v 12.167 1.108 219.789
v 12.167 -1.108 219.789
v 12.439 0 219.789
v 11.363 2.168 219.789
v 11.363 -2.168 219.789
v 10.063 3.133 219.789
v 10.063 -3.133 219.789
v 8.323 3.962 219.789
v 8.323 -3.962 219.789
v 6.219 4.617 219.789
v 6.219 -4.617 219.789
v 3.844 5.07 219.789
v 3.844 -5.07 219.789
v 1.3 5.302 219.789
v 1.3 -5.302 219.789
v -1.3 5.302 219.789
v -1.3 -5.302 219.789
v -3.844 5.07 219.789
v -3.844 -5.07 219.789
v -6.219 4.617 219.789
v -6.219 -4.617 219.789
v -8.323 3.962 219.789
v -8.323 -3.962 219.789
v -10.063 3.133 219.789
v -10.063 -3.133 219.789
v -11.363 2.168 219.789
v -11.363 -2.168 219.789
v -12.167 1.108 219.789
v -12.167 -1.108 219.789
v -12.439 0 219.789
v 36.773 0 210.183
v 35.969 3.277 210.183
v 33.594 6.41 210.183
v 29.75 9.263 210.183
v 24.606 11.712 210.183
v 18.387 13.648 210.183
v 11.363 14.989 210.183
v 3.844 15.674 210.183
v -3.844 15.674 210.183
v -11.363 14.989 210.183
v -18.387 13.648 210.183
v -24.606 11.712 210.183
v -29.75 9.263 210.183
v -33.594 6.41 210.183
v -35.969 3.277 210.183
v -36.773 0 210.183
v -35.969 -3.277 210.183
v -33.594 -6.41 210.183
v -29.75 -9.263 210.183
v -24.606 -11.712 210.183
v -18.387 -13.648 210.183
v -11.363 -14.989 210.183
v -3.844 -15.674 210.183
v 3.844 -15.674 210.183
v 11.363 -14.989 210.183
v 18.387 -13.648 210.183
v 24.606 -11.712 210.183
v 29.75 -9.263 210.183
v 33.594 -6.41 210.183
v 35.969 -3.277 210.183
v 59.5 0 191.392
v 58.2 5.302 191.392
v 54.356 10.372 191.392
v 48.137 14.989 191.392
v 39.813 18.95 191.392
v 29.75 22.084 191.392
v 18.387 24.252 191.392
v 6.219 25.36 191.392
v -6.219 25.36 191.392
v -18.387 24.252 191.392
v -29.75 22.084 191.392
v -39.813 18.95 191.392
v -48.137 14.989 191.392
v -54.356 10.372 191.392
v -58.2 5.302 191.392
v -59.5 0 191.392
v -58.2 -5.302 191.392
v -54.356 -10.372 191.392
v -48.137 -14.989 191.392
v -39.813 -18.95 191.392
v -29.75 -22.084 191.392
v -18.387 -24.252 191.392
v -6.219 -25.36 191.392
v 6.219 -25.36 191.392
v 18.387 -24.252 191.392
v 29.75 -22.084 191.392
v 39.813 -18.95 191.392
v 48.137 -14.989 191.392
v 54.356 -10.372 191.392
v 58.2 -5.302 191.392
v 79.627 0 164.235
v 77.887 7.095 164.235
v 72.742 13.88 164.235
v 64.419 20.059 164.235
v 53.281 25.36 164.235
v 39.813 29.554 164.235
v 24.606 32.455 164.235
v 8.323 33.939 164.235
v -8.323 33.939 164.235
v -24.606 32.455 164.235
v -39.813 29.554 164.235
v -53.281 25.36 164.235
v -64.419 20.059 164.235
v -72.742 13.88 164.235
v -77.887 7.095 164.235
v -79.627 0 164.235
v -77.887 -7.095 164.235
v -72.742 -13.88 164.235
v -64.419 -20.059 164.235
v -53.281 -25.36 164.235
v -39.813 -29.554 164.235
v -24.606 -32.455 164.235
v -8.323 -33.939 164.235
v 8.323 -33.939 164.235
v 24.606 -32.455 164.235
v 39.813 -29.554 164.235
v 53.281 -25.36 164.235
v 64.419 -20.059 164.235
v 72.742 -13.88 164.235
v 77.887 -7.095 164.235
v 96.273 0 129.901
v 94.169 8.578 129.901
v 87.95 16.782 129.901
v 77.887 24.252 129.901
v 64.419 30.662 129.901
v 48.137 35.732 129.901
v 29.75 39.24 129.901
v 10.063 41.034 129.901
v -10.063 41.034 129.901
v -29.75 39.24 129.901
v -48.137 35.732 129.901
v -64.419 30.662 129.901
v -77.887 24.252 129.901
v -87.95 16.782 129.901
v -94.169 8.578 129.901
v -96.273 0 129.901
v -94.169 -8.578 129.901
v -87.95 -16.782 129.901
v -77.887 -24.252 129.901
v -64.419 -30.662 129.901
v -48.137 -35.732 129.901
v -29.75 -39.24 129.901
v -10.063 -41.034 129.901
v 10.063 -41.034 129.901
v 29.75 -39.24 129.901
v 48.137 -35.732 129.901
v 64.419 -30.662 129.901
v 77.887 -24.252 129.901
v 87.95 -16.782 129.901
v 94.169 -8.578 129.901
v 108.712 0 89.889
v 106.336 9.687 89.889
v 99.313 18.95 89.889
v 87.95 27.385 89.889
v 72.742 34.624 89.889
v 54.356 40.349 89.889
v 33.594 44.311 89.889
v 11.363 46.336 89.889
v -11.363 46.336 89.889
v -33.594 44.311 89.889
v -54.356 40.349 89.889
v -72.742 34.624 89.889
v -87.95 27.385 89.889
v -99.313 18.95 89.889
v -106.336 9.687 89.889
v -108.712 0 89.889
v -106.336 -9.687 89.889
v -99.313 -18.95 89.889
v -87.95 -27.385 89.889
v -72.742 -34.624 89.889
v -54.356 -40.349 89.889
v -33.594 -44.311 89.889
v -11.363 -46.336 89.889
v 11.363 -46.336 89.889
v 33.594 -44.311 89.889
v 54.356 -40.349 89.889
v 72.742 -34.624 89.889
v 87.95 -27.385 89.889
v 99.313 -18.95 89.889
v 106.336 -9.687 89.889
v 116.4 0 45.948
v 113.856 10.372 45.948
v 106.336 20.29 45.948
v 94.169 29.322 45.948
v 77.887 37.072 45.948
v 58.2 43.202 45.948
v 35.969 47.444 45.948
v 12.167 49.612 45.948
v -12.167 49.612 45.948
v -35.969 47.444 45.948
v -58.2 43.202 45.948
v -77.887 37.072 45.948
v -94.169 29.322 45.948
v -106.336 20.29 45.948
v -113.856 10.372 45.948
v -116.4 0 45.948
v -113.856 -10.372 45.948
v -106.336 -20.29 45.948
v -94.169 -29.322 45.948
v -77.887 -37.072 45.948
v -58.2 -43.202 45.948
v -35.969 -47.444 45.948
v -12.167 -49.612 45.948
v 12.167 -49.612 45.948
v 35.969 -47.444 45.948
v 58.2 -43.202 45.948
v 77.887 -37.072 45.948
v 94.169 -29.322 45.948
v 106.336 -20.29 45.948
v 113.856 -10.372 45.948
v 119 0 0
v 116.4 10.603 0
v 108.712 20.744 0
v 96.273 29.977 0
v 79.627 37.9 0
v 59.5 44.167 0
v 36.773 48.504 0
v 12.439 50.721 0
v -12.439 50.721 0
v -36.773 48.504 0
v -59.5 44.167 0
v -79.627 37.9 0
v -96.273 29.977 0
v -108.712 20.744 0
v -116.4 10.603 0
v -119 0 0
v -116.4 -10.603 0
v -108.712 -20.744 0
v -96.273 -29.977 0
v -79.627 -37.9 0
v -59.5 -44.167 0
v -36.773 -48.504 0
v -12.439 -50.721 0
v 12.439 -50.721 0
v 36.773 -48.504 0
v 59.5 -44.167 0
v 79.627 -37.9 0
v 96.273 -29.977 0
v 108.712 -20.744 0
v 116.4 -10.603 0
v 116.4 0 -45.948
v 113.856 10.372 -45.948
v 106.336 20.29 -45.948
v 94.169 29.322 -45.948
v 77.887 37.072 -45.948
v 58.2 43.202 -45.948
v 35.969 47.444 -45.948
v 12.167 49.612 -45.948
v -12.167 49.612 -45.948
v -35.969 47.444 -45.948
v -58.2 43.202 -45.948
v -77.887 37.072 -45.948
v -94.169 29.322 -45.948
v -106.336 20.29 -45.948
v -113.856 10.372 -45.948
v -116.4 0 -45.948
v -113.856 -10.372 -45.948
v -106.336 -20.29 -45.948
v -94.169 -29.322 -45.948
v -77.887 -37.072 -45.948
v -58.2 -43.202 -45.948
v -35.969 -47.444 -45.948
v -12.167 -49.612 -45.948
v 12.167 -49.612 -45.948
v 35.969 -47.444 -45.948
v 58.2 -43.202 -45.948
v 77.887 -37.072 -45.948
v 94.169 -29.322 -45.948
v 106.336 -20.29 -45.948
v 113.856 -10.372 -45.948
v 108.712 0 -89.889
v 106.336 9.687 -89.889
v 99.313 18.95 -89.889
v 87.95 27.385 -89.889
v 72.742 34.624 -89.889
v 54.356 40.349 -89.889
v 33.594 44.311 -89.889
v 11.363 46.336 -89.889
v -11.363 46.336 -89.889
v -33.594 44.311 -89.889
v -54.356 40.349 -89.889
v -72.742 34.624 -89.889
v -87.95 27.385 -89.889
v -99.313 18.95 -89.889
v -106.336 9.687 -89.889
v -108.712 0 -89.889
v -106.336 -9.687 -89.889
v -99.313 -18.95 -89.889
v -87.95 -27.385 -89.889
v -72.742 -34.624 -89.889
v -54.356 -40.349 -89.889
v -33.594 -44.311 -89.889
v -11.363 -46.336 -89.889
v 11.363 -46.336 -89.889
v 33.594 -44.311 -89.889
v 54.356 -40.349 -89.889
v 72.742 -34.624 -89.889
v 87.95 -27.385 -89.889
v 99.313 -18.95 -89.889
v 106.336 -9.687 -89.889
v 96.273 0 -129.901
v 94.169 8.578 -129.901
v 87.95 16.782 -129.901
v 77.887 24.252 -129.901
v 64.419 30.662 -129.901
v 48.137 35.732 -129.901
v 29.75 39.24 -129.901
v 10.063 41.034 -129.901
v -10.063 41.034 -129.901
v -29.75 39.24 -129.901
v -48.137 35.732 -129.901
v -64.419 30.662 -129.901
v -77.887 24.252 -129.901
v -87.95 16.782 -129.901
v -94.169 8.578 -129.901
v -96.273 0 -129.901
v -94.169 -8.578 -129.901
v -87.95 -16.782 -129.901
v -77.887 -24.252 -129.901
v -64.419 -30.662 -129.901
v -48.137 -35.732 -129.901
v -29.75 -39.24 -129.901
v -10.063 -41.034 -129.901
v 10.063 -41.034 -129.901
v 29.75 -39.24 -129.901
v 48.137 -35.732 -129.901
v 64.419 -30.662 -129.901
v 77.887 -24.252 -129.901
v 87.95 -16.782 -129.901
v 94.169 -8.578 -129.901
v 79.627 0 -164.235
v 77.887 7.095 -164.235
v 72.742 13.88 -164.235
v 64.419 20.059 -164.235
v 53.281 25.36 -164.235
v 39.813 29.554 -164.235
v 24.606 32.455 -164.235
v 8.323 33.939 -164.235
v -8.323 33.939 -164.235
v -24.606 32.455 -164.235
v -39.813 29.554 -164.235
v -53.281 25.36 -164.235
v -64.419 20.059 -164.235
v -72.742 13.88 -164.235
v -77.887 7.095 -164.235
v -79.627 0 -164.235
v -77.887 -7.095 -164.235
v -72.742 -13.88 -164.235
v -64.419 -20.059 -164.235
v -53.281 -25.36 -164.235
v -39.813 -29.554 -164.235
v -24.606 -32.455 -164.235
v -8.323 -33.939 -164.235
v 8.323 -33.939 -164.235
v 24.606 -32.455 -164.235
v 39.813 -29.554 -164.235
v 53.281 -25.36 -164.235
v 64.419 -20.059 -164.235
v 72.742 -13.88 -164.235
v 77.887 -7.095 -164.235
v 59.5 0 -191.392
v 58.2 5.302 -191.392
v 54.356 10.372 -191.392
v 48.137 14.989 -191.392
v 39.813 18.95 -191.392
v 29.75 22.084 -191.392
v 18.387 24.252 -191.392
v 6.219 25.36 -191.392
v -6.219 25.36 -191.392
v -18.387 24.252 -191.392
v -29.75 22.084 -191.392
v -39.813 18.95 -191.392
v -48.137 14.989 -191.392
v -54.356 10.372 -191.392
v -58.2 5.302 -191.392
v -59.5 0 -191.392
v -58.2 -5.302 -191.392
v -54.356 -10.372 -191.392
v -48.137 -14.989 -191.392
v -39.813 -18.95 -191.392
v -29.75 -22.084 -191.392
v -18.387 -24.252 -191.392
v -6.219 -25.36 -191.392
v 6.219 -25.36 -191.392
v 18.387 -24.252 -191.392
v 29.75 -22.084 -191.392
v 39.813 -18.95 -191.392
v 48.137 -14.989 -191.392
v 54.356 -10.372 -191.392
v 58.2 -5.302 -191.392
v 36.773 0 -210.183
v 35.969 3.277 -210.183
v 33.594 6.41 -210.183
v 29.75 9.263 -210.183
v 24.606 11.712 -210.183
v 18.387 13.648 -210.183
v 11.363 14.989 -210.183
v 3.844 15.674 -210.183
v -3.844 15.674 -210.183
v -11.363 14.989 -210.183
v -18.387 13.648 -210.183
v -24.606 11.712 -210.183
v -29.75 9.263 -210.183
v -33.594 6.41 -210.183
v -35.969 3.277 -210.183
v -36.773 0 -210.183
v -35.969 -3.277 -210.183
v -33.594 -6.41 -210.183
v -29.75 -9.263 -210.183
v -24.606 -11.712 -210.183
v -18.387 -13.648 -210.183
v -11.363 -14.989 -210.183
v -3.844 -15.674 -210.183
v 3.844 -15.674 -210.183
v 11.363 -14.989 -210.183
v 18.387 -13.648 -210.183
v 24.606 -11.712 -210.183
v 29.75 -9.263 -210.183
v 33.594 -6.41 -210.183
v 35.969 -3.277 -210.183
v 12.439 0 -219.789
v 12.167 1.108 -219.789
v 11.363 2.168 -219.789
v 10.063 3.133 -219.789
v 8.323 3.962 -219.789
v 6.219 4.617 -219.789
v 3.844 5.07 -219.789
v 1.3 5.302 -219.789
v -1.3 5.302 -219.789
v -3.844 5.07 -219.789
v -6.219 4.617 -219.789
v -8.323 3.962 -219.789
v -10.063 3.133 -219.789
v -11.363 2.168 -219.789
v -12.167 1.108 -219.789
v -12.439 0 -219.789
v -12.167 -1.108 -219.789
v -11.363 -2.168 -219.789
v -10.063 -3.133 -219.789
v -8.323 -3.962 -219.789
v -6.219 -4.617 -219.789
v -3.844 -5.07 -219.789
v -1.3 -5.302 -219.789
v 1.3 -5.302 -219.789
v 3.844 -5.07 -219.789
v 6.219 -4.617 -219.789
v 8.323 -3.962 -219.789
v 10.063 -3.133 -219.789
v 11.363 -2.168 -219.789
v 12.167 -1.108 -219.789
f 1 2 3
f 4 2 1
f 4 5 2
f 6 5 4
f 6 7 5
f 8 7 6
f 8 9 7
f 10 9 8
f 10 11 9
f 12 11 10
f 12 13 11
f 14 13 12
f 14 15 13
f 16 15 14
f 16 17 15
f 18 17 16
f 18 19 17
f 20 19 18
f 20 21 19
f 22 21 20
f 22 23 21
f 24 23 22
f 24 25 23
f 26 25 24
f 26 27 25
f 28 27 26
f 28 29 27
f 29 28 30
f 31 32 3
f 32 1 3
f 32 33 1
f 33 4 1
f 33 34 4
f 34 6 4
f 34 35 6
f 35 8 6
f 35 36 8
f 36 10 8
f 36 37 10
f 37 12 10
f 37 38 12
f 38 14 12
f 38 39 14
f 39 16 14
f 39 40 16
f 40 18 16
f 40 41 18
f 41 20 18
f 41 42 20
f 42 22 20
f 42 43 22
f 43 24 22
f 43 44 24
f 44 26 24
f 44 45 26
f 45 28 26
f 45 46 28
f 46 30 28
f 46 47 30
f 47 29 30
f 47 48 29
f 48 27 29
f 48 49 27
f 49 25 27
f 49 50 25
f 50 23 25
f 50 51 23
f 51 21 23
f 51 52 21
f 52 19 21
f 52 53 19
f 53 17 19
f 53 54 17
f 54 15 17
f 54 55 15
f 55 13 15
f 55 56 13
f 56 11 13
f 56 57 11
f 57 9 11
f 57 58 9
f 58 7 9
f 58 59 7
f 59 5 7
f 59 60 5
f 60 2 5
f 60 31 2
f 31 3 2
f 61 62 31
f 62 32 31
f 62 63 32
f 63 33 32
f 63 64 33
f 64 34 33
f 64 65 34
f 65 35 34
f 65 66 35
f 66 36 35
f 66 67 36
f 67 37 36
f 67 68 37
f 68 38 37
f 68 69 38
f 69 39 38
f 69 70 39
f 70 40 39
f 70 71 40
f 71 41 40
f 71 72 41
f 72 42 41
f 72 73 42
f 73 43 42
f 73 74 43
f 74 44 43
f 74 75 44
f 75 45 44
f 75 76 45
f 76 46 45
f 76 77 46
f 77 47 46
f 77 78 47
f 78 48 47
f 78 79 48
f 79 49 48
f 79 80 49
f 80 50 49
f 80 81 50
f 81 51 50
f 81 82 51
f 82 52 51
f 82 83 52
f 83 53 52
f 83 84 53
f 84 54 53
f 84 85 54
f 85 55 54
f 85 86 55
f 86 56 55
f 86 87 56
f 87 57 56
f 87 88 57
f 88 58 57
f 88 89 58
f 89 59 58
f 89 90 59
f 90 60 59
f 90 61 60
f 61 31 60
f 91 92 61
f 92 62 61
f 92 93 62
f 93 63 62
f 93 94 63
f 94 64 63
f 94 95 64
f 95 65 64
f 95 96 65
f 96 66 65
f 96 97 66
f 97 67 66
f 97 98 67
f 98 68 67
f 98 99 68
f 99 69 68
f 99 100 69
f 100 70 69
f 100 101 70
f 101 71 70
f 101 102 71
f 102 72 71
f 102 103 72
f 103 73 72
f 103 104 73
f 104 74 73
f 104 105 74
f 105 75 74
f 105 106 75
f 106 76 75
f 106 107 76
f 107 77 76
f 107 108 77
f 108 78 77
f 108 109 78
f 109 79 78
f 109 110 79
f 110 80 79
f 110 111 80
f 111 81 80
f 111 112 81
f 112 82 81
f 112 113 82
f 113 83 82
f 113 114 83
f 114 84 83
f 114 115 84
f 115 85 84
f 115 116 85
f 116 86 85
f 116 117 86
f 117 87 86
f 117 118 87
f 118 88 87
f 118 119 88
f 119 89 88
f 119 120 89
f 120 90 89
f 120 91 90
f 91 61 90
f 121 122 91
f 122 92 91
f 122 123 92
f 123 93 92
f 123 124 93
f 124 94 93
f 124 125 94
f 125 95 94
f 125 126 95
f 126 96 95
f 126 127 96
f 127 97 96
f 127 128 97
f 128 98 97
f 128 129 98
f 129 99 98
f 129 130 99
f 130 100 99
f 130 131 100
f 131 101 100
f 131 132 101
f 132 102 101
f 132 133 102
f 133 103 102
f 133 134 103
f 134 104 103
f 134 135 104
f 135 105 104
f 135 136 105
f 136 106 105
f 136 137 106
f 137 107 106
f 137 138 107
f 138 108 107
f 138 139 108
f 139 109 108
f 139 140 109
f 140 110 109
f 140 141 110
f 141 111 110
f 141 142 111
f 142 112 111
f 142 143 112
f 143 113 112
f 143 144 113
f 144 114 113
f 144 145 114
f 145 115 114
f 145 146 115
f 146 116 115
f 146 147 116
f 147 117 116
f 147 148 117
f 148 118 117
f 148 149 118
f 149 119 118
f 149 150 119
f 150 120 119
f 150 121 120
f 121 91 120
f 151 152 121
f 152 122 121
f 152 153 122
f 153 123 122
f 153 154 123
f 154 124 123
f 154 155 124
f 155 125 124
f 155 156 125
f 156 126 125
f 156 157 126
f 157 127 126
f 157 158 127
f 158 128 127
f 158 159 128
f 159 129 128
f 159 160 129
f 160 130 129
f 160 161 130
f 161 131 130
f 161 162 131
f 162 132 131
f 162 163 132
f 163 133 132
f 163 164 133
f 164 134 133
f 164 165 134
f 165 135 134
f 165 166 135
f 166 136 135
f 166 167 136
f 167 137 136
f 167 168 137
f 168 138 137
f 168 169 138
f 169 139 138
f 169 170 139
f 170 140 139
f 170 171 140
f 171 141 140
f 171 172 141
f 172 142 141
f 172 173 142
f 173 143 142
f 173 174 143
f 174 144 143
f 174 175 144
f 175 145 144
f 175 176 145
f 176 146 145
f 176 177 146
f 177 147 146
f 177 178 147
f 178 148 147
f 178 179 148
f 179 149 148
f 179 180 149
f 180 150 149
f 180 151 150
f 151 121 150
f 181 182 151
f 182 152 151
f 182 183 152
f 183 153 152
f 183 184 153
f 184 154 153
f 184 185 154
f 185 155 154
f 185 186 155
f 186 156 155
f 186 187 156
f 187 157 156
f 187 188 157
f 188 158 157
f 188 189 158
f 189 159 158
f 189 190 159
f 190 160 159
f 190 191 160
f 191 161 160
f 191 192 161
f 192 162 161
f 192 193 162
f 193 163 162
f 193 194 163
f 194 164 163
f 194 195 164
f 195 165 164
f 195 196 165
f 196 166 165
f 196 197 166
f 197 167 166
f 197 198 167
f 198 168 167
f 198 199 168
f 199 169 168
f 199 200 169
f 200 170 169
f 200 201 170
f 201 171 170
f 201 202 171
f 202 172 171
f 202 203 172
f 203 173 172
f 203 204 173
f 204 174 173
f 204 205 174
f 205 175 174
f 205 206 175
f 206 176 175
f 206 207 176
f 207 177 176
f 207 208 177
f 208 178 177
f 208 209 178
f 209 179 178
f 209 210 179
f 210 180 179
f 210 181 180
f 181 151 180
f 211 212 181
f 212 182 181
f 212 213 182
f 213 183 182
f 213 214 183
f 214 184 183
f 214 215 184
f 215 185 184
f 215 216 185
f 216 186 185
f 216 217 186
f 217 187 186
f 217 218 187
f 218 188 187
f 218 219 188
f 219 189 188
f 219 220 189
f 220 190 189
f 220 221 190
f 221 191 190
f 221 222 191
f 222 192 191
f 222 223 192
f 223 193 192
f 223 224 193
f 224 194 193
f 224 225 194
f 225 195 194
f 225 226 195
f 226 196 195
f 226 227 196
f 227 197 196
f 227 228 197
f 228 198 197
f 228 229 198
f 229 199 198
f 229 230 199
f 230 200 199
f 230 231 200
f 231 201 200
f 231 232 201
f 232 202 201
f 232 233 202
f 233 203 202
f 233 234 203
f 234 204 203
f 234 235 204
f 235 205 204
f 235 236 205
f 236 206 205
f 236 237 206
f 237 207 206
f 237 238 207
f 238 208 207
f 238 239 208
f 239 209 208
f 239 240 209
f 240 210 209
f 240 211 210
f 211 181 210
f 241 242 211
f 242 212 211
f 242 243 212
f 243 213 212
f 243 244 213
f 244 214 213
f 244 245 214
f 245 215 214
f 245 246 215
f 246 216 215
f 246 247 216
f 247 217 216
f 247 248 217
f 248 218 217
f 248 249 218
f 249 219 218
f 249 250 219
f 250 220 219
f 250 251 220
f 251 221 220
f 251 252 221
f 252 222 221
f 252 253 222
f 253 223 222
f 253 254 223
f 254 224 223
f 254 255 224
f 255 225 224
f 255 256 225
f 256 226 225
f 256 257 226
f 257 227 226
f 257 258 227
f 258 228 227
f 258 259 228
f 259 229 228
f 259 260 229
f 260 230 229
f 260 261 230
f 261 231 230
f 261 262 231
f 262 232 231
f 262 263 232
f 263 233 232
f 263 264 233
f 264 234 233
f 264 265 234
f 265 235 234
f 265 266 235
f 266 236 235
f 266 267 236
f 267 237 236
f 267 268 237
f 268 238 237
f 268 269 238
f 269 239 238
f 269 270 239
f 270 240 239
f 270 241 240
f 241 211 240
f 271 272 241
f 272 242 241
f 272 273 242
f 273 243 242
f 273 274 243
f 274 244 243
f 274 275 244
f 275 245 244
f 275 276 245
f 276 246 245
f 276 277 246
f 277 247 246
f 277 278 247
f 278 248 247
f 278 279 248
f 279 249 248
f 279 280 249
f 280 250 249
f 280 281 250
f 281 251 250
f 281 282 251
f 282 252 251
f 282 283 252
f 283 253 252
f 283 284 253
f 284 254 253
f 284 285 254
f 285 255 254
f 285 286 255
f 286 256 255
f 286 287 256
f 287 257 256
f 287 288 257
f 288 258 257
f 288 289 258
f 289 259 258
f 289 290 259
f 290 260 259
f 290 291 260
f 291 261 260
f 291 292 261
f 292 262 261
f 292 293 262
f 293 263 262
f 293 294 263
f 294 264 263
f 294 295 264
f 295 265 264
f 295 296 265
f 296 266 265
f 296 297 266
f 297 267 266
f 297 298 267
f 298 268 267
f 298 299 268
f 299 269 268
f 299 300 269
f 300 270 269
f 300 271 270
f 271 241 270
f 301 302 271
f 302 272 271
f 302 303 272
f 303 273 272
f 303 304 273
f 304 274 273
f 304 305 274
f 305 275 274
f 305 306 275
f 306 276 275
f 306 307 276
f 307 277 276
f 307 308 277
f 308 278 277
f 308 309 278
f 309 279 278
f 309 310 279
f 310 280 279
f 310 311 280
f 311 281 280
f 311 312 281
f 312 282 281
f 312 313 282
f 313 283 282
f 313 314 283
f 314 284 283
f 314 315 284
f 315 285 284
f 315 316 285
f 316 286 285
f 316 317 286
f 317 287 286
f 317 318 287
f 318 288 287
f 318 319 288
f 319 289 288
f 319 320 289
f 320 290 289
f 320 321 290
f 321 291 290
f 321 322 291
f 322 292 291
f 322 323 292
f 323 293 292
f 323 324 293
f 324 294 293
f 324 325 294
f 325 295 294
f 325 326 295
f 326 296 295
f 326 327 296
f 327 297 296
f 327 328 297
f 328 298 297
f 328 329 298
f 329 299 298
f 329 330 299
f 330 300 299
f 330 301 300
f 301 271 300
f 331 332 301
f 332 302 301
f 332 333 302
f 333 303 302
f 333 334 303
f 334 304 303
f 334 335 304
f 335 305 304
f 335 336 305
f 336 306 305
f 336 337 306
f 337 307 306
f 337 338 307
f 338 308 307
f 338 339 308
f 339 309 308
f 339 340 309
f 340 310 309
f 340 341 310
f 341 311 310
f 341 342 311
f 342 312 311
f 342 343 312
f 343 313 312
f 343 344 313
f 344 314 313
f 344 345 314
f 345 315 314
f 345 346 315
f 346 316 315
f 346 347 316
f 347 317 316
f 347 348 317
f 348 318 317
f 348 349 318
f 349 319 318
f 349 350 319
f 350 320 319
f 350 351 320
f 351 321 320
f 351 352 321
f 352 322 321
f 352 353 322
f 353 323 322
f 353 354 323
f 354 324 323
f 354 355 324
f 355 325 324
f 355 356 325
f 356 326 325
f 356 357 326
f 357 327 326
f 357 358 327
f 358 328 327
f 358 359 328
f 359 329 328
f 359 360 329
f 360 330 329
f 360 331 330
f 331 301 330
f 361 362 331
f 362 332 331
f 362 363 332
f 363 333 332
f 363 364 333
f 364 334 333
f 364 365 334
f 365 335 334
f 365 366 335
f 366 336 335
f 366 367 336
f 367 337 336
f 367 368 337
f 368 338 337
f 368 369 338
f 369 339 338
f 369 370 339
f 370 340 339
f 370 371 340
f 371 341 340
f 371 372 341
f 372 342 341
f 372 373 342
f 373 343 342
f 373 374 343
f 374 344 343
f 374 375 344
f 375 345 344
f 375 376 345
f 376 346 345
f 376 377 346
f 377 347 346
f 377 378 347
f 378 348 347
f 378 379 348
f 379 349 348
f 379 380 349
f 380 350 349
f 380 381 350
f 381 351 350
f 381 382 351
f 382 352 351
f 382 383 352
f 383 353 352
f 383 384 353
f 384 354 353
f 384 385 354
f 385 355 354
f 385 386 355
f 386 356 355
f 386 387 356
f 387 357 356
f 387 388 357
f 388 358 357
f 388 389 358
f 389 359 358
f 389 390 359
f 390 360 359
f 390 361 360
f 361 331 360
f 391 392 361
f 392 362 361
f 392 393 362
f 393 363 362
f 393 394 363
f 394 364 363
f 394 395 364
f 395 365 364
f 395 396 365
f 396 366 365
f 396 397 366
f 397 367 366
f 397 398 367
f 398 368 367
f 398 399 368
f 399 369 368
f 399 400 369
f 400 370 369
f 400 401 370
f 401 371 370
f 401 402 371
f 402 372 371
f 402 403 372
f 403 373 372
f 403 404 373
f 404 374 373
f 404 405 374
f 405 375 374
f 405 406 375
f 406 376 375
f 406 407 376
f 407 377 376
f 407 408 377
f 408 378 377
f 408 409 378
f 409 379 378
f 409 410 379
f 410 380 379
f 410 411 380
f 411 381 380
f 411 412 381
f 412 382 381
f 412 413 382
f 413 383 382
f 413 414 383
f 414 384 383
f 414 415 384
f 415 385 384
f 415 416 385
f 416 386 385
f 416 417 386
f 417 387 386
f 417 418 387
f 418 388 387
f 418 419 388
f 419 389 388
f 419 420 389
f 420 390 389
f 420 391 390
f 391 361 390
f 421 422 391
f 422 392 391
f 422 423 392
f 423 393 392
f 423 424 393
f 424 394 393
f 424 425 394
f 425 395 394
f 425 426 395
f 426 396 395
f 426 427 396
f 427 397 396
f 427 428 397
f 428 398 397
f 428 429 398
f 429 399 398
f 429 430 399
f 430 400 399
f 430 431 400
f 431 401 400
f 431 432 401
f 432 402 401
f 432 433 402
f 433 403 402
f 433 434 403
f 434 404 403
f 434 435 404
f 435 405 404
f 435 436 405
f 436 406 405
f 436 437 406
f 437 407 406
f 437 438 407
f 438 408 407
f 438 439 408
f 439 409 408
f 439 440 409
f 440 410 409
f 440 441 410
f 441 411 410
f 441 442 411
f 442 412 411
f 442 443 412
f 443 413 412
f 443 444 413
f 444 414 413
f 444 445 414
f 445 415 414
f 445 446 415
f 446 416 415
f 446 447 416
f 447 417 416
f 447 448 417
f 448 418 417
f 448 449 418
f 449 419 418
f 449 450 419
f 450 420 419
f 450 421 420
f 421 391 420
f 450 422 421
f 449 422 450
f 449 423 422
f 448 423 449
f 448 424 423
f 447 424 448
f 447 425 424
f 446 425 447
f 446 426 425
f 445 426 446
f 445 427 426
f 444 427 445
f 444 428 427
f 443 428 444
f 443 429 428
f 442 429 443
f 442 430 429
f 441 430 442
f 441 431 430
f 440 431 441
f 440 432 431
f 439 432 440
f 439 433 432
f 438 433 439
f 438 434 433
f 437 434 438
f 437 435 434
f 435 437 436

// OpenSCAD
// Generated by SolidPython 1.0.1 on 2020-07-29 00:46:47


scale(v = [7, 3, 13]) {
	sphere(r = 17);
}
/***********************************************
*********      SolidPython code:      **********
************************************************
 
# import packages: SolidPython
from solid import *
from solid.utils import *
from itertools import chain, combinations, permutations


class Resize:

    def __init__(self, scad_file):
        self.scad_file = scad_file
        #self.scad_file = import_scad(scad_file)
        # cone/cylinder param:
        self.r1 = 0
        self.r2 = 0
        self.h = 0
        # rectangular prism param:
        self.w = 0
        self.l = 0
        # ellipse param:
        self.r = 0

    # import OpenScad code (file name corresponds to shape)


    # classify shape + parameters
    def assign(self, param1, param2, param3):
        if self.scad_file == 'cone.scad':
            self.r1 = param1
            self.r2 = param2
            self.h = param3
        elif self.scad_file == 'cylinder.scad':
            self.r1 = param1
            self.r2 = param2
            self.h = param3
        elif self.scad_file == 'rectangularPrism.scad':
            self.h = param1
            self.l = param2
            self.w = param3
        else:
            self.r = param1
            self.h = param2

    # resize parameters
    def iterate(self):
        x = range(3, 20, 2)
        i = 1
        if self.scad_file == 'cone.scad':
            tempList = list(permutations(x, 2))
            for temp in tempList:
                param1 = temp[0]
                param2 = temp[1]
                filepath = 'produced_scad_files/' + 'cone' + str(param1) + '_' + str(param2) + '_' + '.scad'
                scad_render_to_file(cylinder(h=param1, r1=param2, r2=0), filepath)

        elif self.scad_file == 'cylinder.scad':
            tempList = list(permutations(x, 3))
            for temp in tempList:
                param1 = temp[0]
                param2 = temp[1]
                filepath = 'produced_scad_files/' + 'cylinder' + str(param1) + '_' + str(param2) + '_' + '.scad'
                scad_render_to_file(cylinder(h=param1, r1=param2, r2=param2), filepath)

        elif self.scad_file == 'rectangularPrism.scad':
            tempList = list(permutations(x, 3))
            for temp in tempList:
                param1 = temp[0]
                param2 = temp[1]
                param3 = temp[2]
                filepath = 'produced_scad_files/' + 'rectangularPrism' + str(param1) + '_' + str(param2) + '_' + str(
                    param3) + '.scad'
                scad_render_to_file(cube(size=(param1, param2, param3)), filepath)

        elif self.scad_file == 'ellipse.scad':
            tempList = list(permutations(x, 4))
            for temp in tempList:
                param1 = temp[0]
                param2 = temp[1]
                param3 = temp[2]
                param4 = temp[3]
                filepath = 'produced_scad_files/' + 'ellipse' + str(param1) + '_' + str(param2) + '_' + str(param3) + '_' + str(param4) + '.scad'
                scad_render_to_file(scale([param1, param2, param3])(sphere(r=param4)), filepath)

    def render_to_scadfile(self):
        scad_render_to_file(scad, 'example.scad') 
 
************************************************/
